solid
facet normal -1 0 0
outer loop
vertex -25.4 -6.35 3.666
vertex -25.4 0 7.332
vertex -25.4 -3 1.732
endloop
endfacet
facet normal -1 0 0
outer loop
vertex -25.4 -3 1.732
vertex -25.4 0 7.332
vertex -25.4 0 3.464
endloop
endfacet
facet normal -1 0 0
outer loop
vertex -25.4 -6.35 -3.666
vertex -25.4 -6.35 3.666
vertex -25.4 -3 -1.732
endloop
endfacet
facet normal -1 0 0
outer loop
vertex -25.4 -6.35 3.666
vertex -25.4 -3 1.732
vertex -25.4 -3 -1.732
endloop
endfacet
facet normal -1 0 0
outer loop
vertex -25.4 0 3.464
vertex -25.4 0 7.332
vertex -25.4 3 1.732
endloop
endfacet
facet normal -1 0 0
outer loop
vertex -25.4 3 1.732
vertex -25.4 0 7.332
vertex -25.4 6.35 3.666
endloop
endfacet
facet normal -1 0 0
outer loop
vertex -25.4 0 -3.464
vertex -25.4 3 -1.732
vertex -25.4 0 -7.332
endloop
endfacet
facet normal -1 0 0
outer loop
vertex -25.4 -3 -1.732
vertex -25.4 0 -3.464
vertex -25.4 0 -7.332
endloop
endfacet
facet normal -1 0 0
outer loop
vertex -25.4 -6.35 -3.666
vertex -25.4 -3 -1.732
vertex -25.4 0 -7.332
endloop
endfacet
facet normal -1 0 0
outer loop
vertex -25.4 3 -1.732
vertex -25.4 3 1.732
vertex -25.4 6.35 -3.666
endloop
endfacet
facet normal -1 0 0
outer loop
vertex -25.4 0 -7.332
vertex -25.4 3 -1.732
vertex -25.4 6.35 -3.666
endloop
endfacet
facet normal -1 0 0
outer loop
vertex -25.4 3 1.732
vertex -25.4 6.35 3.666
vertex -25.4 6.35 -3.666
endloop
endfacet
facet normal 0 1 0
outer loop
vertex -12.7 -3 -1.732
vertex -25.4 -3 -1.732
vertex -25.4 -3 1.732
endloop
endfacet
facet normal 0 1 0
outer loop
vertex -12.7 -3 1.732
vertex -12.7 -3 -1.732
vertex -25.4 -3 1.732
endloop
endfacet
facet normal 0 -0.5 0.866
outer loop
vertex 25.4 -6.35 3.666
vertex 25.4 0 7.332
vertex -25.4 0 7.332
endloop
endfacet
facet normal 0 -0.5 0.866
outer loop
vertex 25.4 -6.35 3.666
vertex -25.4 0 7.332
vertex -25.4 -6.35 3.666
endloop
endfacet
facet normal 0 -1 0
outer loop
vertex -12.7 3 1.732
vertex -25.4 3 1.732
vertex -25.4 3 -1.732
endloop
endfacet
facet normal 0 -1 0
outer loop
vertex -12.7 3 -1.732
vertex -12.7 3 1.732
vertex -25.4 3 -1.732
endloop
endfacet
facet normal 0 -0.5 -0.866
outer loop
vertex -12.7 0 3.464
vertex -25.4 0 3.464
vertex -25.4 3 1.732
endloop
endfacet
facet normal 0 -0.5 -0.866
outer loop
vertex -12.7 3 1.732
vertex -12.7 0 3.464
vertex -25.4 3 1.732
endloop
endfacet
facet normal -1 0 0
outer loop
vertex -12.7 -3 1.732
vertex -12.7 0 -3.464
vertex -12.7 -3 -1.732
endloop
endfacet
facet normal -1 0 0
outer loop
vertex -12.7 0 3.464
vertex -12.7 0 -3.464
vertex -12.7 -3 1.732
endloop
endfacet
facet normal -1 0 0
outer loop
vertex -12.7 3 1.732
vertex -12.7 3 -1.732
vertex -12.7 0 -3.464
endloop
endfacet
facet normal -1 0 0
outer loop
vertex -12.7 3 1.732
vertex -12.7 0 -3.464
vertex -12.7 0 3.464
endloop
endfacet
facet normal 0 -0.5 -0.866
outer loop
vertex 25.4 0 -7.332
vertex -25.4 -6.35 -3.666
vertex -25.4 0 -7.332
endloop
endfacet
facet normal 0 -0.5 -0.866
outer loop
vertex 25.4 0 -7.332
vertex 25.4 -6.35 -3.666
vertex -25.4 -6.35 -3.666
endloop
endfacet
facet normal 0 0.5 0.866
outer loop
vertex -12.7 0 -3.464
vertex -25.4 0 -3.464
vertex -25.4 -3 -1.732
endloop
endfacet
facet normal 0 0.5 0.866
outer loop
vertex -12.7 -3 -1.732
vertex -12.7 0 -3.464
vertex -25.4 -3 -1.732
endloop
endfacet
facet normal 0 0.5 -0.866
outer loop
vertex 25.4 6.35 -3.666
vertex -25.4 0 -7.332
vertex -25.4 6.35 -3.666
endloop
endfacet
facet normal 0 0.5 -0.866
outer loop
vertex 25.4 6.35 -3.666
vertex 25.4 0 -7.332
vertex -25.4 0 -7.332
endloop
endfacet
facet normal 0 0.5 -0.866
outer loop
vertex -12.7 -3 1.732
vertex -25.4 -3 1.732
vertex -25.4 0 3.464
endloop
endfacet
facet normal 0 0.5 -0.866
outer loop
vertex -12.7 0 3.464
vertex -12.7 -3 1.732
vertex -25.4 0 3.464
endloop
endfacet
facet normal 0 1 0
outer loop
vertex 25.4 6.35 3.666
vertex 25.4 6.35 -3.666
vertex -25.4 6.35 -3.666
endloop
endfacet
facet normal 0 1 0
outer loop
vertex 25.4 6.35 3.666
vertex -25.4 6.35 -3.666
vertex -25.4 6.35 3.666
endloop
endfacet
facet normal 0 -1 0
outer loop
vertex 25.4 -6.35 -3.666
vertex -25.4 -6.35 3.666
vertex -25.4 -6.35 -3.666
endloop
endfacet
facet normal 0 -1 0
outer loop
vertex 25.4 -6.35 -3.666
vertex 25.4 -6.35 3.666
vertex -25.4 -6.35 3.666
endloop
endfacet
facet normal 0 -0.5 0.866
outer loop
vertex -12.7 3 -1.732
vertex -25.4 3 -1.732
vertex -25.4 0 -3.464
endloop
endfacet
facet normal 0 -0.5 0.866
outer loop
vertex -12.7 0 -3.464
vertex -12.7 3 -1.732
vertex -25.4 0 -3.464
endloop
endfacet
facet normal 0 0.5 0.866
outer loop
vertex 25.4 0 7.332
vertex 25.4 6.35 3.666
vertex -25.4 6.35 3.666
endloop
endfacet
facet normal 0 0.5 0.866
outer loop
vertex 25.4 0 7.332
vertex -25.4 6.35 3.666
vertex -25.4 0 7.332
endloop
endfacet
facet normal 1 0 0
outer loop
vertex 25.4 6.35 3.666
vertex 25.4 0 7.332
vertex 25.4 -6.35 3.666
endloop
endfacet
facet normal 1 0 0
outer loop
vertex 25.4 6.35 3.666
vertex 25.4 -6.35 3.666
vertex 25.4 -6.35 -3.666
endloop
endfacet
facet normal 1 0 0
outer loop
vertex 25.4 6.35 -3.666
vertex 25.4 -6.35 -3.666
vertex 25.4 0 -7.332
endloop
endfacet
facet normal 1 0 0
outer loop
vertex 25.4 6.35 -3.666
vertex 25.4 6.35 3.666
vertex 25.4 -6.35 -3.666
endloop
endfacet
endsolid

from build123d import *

# Parameters (mm, degrees)
BOSS_EXTRUDE1_DEPTH = 25.4
CUT_EXTRUDE1_DEPTH  = 12.7


with BuildPart() as part:
    # Sketch1 → Boss-Extrude1 (new, symmetric)
    with BuildSketch(Plane(origin=(0, 0, 0), x_dir=(0, 0, -1), z_dir=(1, 0, 0))):
        Polygon((7.332348419, 0), (3.666174209, 6.35), (-3.666174209, 6.35), (-7.332348419, 0), (-3.666174209, -6.35), (3.666174209, -6.35), align=None)
    extrude(amount=BOSS_EXTRUDE1_DEPTH, both=True)

    # Sketch2 → Cut-Extrude1 (cut)
    with BuildSketch(Plane.ZY.offset(25.4)):
        Polygon((3.464101579, 0), (1.73205079, 2.999999969), (-1.73205079, 2.999999969), (-3.464101579, 0), (-1.73205079, -2.999999969), (1.73205079, -2.999999969), align=None)
    extrude(amount=-CUT_EXTRUDE1_DEPTH, mode=Mode.SUBTRACT)


solid = part.part
